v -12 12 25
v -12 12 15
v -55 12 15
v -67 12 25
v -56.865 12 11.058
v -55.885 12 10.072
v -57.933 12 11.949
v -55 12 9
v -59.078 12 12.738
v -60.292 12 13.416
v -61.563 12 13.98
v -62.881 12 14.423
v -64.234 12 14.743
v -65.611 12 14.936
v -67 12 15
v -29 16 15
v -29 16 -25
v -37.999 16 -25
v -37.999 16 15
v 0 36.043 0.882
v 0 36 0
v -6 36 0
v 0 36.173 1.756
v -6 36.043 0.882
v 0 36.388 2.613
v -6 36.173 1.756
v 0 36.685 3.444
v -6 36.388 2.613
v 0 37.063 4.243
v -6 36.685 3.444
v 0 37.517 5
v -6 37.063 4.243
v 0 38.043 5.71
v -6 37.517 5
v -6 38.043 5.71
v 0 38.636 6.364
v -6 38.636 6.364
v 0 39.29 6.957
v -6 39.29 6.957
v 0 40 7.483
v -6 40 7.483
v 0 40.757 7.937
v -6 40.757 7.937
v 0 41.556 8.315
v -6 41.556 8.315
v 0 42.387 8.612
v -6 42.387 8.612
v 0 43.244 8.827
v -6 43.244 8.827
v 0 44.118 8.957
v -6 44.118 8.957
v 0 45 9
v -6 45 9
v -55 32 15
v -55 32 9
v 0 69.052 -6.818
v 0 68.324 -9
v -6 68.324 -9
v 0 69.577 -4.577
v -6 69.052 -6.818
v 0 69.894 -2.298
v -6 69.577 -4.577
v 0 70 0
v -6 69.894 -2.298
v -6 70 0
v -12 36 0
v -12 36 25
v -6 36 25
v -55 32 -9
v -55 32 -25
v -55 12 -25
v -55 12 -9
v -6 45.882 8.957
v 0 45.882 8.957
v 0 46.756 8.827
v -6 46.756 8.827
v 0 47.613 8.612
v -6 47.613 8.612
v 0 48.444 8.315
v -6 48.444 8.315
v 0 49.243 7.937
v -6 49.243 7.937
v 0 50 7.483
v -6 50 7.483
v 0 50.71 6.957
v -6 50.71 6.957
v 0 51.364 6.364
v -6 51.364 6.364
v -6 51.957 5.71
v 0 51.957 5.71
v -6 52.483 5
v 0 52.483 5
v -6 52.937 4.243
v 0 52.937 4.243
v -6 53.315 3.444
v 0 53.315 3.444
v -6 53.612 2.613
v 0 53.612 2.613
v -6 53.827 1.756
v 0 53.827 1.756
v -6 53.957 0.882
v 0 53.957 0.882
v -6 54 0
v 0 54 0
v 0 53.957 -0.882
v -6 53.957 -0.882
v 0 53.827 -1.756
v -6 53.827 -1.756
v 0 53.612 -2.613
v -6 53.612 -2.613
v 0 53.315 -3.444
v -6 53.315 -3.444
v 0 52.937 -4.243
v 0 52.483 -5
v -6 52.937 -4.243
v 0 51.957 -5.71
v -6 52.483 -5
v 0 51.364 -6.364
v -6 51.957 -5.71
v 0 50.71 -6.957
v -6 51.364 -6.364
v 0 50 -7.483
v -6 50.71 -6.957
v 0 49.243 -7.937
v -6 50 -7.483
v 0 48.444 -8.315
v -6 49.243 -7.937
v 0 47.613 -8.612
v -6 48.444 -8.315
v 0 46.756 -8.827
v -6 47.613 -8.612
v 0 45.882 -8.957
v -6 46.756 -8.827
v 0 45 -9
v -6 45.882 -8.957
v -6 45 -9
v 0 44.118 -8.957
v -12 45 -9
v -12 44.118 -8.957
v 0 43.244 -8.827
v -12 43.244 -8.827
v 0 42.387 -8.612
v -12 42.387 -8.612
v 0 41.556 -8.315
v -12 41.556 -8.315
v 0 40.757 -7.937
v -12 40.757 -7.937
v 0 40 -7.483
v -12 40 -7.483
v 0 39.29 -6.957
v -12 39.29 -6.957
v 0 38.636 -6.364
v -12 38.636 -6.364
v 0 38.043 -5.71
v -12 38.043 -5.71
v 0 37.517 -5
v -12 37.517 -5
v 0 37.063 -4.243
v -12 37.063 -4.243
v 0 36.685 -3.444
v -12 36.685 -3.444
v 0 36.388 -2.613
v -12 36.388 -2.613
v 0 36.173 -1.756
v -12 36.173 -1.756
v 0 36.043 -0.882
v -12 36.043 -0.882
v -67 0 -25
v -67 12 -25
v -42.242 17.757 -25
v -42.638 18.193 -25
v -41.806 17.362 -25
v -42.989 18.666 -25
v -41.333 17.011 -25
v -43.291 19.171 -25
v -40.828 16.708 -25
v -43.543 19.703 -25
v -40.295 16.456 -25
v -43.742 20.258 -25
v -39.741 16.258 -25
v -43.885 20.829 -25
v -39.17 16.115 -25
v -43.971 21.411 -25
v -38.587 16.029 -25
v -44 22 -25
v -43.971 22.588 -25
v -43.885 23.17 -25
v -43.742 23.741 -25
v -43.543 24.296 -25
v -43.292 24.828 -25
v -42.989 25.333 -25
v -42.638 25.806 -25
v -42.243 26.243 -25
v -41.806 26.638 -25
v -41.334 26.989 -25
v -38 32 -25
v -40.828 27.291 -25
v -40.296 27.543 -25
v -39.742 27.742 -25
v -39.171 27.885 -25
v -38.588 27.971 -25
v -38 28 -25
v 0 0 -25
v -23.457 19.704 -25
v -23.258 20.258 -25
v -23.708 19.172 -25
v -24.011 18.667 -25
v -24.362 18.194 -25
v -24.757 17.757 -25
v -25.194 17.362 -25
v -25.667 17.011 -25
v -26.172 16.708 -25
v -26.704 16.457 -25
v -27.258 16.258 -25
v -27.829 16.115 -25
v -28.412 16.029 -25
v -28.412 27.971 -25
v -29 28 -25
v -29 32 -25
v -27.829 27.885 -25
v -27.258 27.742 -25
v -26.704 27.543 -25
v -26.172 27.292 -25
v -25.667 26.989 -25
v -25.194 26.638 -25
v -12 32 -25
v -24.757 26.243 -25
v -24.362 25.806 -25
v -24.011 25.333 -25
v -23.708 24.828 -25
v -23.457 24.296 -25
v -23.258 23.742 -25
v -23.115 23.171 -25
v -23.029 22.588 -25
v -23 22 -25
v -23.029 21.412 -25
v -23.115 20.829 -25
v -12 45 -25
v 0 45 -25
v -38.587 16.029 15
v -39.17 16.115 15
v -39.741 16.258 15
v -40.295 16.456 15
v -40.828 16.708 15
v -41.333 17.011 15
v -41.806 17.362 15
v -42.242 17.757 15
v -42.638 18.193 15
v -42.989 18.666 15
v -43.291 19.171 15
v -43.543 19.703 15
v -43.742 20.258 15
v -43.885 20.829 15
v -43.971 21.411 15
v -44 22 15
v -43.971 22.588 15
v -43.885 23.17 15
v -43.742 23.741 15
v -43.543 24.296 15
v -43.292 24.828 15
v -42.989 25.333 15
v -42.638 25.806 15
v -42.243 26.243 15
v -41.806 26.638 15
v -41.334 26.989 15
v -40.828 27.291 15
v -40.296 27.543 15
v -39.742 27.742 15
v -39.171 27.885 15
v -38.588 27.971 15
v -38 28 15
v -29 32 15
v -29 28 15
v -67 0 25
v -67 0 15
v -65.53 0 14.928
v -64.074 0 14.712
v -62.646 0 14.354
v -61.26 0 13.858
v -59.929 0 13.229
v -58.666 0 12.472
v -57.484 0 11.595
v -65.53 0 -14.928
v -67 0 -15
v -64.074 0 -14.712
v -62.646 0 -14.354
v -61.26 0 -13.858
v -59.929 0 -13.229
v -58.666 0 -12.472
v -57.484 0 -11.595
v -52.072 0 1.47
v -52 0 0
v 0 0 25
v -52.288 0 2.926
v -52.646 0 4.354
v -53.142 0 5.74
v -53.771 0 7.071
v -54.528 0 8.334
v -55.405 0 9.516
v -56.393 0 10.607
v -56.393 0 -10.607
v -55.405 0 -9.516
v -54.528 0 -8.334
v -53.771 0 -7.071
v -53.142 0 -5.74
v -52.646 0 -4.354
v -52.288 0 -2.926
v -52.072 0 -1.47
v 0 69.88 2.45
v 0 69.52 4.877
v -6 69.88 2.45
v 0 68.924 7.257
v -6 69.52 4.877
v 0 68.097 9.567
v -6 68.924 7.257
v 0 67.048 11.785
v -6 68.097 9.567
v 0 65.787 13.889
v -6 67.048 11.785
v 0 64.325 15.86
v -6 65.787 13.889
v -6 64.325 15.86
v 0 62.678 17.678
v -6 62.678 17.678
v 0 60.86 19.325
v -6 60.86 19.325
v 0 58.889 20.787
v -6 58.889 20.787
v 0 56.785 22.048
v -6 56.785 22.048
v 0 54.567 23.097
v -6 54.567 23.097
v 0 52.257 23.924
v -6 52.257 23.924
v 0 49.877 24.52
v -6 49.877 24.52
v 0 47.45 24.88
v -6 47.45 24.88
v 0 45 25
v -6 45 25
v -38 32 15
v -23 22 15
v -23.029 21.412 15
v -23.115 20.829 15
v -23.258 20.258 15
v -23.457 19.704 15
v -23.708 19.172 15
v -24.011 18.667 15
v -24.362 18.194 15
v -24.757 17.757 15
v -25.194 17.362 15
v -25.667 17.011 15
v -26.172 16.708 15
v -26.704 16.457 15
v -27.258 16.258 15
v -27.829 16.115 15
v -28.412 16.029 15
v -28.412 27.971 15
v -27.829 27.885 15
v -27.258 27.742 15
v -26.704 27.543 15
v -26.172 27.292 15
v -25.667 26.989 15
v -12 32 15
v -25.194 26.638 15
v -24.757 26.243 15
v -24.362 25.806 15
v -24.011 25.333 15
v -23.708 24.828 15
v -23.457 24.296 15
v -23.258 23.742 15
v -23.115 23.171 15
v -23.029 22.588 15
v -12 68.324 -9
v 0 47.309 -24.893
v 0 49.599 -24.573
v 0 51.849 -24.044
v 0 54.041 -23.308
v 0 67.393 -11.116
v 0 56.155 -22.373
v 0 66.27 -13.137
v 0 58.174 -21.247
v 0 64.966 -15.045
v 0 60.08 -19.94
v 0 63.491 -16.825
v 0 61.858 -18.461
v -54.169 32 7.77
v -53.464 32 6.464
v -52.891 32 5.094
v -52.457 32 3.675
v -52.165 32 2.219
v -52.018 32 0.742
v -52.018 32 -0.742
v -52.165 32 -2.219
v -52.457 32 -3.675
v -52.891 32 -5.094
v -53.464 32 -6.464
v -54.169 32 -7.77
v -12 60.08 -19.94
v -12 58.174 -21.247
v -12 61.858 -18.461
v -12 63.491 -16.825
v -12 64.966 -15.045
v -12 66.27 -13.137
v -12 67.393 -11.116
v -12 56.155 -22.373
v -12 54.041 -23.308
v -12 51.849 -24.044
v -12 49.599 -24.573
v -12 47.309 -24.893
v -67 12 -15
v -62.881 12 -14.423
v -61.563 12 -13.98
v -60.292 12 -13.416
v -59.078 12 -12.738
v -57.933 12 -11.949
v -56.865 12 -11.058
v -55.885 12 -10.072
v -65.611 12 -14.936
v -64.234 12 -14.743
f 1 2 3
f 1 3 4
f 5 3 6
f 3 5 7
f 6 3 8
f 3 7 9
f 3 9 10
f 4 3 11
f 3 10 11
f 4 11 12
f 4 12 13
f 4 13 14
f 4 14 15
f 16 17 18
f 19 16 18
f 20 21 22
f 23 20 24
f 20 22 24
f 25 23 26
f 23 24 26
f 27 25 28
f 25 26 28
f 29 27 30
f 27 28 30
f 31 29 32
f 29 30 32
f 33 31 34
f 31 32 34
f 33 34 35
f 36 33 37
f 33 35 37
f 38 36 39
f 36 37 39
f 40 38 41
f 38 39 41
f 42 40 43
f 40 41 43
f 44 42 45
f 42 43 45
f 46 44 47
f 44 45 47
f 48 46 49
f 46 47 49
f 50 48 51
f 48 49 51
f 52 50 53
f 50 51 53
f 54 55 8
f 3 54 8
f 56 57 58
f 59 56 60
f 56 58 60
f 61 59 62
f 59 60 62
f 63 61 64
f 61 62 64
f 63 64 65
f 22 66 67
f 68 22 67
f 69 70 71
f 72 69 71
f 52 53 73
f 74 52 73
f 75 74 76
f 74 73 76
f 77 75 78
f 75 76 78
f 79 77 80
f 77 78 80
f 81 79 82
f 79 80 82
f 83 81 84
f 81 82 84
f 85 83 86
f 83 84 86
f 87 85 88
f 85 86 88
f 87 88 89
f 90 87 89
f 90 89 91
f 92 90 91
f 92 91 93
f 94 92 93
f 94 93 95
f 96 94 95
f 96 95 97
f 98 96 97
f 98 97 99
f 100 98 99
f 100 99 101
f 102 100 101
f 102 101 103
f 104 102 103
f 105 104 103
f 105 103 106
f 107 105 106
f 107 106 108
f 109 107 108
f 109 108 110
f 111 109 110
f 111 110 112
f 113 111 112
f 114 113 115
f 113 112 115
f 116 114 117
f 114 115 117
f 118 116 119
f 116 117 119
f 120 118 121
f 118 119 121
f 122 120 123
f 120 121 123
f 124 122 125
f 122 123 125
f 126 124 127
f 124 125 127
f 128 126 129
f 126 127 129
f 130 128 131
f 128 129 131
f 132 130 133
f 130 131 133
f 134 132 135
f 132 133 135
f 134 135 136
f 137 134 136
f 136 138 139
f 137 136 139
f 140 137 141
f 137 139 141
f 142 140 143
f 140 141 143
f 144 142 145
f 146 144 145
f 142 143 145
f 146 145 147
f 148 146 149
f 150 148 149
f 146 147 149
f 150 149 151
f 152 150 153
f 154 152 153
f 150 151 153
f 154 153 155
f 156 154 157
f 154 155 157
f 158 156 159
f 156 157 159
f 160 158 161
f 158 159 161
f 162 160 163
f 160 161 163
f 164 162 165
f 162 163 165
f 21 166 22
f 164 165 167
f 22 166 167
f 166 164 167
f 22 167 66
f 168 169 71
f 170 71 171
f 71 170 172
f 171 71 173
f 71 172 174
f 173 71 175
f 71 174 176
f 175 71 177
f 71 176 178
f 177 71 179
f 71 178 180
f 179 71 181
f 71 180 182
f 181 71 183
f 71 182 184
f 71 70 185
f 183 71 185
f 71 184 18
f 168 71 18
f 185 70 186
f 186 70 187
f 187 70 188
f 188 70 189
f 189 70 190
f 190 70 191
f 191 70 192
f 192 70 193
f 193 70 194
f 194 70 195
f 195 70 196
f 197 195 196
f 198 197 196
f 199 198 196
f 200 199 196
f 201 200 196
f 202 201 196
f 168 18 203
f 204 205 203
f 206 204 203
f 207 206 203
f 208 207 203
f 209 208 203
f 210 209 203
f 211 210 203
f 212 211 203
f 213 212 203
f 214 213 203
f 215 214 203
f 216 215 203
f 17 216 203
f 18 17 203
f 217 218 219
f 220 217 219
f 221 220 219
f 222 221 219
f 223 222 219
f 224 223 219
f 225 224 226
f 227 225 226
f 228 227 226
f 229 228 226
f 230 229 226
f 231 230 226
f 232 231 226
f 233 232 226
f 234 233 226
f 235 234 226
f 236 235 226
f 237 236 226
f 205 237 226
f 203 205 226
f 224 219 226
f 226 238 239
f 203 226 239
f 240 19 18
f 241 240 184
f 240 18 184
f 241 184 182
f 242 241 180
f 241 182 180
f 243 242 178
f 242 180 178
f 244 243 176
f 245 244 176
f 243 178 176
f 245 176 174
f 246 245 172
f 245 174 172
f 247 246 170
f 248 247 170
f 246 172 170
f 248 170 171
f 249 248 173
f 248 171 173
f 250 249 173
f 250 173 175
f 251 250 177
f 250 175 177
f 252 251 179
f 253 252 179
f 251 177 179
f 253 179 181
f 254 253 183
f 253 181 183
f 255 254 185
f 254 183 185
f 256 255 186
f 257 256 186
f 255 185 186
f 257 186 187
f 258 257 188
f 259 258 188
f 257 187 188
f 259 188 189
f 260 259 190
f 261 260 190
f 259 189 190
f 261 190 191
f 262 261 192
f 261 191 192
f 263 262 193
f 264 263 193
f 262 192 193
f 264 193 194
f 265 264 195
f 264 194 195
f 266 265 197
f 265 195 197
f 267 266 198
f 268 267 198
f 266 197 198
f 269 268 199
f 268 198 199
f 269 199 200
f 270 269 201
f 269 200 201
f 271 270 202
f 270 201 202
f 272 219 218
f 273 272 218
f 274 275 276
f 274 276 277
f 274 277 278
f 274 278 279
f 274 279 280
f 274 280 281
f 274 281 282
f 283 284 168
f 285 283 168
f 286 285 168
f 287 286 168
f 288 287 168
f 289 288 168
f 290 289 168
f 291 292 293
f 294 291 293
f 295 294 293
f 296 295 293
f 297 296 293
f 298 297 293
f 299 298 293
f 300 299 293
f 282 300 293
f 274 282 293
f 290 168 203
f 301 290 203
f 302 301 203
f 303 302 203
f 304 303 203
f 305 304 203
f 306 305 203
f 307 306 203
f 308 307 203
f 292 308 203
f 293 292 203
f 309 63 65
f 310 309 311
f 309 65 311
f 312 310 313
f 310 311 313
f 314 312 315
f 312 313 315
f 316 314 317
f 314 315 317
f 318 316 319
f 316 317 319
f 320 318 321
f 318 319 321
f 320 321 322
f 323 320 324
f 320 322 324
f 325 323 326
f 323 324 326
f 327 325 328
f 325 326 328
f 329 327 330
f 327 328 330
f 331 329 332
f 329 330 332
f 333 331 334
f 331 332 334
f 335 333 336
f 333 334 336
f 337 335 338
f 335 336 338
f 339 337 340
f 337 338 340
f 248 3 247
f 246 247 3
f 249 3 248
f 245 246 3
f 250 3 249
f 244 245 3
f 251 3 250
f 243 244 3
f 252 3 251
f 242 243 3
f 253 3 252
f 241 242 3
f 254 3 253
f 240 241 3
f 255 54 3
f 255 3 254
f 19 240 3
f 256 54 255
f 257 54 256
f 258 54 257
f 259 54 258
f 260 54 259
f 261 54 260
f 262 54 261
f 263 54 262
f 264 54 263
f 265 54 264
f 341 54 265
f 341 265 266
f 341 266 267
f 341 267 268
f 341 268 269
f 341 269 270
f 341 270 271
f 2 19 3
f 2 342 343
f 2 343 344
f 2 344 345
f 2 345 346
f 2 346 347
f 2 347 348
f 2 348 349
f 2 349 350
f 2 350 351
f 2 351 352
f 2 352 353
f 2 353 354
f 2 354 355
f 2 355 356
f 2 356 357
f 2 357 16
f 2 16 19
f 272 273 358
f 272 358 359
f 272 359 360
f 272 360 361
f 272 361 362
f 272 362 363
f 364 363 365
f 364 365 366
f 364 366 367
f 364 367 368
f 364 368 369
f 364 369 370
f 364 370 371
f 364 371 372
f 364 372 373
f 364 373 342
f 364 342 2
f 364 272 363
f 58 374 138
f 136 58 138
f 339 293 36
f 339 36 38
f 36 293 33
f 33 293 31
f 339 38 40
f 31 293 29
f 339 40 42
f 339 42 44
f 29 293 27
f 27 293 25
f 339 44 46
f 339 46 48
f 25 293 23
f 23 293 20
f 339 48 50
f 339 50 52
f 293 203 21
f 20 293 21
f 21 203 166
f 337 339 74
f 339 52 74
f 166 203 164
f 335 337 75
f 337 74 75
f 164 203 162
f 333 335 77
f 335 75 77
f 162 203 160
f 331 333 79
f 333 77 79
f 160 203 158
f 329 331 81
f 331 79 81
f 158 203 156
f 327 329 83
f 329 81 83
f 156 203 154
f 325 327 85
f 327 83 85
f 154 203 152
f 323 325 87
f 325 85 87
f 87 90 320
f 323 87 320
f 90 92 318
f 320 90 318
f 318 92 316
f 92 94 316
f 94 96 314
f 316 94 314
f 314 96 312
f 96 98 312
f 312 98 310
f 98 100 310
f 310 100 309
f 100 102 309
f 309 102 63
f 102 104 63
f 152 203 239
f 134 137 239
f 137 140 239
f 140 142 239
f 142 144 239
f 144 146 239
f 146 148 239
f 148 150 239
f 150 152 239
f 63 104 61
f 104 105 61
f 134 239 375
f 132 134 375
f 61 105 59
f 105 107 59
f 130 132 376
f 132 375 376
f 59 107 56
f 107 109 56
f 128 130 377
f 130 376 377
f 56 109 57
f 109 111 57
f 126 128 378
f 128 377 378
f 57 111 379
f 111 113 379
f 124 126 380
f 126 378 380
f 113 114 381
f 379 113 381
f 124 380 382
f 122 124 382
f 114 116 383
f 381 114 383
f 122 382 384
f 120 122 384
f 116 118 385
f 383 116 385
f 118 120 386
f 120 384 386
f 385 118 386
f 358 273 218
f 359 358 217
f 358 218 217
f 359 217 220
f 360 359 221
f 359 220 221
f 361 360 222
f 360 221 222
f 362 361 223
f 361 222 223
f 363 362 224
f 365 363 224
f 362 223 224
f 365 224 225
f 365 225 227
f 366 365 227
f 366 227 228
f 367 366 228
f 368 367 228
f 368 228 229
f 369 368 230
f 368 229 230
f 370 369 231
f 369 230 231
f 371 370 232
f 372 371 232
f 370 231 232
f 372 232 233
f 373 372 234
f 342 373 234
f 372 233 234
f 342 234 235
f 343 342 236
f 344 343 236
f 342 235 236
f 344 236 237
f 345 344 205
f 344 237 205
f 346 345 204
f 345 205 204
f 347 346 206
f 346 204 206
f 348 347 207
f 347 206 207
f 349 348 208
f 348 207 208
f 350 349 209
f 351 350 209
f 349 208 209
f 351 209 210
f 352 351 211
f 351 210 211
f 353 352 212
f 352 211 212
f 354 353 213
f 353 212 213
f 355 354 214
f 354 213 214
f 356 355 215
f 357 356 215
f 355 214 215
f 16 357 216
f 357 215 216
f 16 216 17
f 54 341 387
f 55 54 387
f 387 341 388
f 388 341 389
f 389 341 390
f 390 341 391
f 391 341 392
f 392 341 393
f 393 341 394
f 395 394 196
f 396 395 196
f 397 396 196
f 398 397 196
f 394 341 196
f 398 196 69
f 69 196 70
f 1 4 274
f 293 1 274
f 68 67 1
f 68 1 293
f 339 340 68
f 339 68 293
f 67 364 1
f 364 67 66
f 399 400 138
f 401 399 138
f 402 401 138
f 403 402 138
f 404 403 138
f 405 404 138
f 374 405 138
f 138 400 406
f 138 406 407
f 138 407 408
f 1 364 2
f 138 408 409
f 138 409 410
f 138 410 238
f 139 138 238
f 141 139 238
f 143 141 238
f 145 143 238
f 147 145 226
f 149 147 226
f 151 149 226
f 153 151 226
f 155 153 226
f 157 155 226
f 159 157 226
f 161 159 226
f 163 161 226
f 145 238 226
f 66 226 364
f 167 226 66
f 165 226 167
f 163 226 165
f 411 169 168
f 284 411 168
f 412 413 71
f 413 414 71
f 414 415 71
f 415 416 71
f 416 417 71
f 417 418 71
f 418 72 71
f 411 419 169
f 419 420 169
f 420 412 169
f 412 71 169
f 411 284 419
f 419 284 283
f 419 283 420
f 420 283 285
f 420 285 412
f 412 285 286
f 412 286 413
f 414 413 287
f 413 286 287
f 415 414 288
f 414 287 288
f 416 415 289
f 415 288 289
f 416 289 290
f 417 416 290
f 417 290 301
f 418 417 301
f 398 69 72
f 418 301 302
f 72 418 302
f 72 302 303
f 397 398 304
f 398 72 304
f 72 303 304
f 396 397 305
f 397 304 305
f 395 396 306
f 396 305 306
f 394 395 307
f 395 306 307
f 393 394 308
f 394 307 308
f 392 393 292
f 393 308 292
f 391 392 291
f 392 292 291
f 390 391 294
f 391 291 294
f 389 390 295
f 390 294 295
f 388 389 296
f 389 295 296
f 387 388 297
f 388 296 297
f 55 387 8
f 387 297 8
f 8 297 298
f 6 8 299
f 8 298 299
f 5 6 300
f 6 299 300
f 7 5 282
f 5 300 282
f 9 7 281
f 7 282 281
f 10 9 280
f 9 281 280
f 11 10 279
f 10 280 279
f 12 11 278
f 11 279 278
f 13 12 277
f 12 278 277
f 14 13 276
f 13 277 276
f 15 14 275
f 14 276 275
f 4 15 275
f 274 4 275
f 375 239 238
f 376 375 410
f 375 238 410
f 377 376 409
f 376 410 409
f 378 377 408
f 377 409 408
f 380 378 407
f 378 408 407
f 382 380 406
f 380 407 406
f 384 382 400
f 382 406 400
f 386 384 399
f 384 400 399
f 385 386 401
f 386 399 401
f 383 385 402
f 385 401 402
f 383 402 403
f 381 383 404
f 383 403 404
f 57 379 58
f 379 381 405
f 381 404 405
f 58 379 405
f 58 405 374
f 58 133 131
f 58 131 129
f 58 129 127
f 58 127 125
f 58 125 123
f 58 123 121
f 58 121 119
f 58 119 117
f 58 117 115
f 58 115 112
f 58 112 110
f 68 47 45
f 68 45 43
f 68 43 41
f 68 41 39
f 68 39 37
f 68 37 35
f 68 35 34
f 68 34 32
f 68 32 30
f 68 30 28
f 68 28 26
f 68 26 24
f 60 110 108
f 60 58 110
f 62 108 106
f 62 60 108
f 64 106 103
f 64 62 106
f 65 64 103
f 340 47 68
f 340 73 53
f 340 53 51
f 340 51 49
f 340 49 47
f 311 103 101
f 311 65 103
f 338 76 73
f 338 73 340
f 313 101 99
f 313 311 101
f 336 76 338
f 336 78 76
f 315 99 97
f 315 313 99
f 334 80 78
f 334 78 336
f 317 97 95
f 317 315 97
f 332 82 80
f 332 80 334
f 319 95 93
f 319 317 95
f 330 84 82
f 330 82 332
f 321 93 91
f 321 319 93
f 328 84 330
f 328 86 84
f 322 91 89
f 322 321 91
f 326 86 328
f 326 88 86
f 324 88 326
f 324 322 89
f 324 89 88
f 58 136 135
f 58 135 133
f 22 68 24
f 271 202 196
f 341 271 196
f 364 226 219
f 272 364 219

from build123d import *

# Parameters (mm, degrees)
BOSS_EXTRUDE1_DEPTH      = 25
BOSS_EXTRUDE1_DEPTH_BACK = 25
BOSS_EXTRUDE2_DEPTH      = 15
BOSS_EXTRUDE2_DEPTH_BACK = 25
SKETCH2_R                = 15
CUT_EXTRUDE1_DEPTH       = 101.069975517
CUT_EXTRUDE2_DEPTH       = 93.466210045
SKETCH3_6_R              = 9
CUT_EXTRUDE3_DEPTH       = 93.466210045
CUT_EXTRUDE4_DEPTH       = 6


with BuildPart() as part:
    # Sketch1 → Boss-Extrude1 (new, two sides: drawn at the far end of the back side and taken through both)
    with BuildSketch(Plane.XY.offset(-BOSS_EXTRUDE1_DEPTH_BACK)):
        Polygon((-14.682422452, 0), (0, 0), (0, 10.443131462), (0, 70), (-12, 70), (-12, 32), (-12, 12), (-55, 12), (-67, 12), (-67, 0), align=None)
    extrude(amount=BOSS_EXTRUDE1_DEPTH + BOSS_EXTRUDE1_DEPTH_BACK)

    # Sketch1<3> → Boss-Extrude2 (add, two sides: drawn at the far end of the back side and taken through both)
    with BuildSketch(Plane.XY.offset(-BOSS_EXTRUDE2_DEPTH_BACK)):
        with BuildLine():
            Line((-55, 32), (-55, 12))
            Line((-55, 12), (-12, 12))
            Line((-12, 12), (-12, 32))
            Line((-12, 32), (-29, 32))
            Line((-29, 32), (-29, 28.000000026))
            ThreePointArc((-29, 28.000000026), (-23, 22.000000026), (-29, 16.000000026))
            Line((-29, 16.000000026), (-37.999206574, 16.000000026))
            ThreePointArc((-37.999206574, 16.000000026), (-44.000000013, 21.999603287), (-38, 28.000000026))
            Line((-38, 28.000000026), (-38, 32))
            Line((-38, 32), (-55, 32))
        make_face()
    extrude(amount=BOSS_EXTRUDE2_DEPTH + BOSS_EXTRUDE2_DEPTH_BACK)

    # Sketch2 → Cut-Extrude1 (cut, through all)
    with BuildSketch(Plane.XZ):
        with Locations((-67, 0)):
            Circle(SKETCH2_R)
    extrude(amount=-CUT_EXTRUDE1_DEPTH, mode=Mode.SUBTRACT)

    # Sketch3 → Cut-Extrude2 (cut, through all)
    with BuildSketch(Plane.ZY.offset(12)):
        with BuildLine():
            ThreePointArc((-25, 45), (-17.67766953, 62.67766953), (0, 70))
            Line((0, 70), (-25, 70))
            Line((-25, 70), (-25, 45))
        make_face()
        with BuildLine():
            Line((25, 70), (0, 70))
            ThreePointArc((0, 70), (17.67766953, 62.67766953), (25, 45))
            Line((25, 45), (25, 70))
        make_face()
    extrude(amount=-CUT_EXTRUDE2_DEPTH, mode=Mode.SUBTRACT)

    # Sketch3<6> → Cut-Extrude3 (cut, through all)
    with BuildSketch(Plane.ZY.offset(12)):
        with Locations((0, 45)):
            Circle(SKETCH3_6_R)
    extrude(amount=-CUT_EXTRUDE3_DEPTH, mode=Mode.SUBTRACT)

    # Sketch3<7> → Cut-Extrude4 (cut)
    with BuildSketch(Plane.ZY.offset(12)):
        with BuildLine():
            Line((-9, 68.323807579), (-9, 45))
            ThreePointArc((-9, 45), (6.363961031, 51.363961031), (0, 36))
            Line((0, 36), (25, 36))
            Line((25, 36), (25, 45))
            ThreePointArc((25, 45), (14.142135624, 65.615528128), (-9, 68.323807579))
        make_face()
    extrude(amount=-CUT_EXTRUDE4_DEPTH, mode=Mode.SUBTRACT)


solid = part.part
